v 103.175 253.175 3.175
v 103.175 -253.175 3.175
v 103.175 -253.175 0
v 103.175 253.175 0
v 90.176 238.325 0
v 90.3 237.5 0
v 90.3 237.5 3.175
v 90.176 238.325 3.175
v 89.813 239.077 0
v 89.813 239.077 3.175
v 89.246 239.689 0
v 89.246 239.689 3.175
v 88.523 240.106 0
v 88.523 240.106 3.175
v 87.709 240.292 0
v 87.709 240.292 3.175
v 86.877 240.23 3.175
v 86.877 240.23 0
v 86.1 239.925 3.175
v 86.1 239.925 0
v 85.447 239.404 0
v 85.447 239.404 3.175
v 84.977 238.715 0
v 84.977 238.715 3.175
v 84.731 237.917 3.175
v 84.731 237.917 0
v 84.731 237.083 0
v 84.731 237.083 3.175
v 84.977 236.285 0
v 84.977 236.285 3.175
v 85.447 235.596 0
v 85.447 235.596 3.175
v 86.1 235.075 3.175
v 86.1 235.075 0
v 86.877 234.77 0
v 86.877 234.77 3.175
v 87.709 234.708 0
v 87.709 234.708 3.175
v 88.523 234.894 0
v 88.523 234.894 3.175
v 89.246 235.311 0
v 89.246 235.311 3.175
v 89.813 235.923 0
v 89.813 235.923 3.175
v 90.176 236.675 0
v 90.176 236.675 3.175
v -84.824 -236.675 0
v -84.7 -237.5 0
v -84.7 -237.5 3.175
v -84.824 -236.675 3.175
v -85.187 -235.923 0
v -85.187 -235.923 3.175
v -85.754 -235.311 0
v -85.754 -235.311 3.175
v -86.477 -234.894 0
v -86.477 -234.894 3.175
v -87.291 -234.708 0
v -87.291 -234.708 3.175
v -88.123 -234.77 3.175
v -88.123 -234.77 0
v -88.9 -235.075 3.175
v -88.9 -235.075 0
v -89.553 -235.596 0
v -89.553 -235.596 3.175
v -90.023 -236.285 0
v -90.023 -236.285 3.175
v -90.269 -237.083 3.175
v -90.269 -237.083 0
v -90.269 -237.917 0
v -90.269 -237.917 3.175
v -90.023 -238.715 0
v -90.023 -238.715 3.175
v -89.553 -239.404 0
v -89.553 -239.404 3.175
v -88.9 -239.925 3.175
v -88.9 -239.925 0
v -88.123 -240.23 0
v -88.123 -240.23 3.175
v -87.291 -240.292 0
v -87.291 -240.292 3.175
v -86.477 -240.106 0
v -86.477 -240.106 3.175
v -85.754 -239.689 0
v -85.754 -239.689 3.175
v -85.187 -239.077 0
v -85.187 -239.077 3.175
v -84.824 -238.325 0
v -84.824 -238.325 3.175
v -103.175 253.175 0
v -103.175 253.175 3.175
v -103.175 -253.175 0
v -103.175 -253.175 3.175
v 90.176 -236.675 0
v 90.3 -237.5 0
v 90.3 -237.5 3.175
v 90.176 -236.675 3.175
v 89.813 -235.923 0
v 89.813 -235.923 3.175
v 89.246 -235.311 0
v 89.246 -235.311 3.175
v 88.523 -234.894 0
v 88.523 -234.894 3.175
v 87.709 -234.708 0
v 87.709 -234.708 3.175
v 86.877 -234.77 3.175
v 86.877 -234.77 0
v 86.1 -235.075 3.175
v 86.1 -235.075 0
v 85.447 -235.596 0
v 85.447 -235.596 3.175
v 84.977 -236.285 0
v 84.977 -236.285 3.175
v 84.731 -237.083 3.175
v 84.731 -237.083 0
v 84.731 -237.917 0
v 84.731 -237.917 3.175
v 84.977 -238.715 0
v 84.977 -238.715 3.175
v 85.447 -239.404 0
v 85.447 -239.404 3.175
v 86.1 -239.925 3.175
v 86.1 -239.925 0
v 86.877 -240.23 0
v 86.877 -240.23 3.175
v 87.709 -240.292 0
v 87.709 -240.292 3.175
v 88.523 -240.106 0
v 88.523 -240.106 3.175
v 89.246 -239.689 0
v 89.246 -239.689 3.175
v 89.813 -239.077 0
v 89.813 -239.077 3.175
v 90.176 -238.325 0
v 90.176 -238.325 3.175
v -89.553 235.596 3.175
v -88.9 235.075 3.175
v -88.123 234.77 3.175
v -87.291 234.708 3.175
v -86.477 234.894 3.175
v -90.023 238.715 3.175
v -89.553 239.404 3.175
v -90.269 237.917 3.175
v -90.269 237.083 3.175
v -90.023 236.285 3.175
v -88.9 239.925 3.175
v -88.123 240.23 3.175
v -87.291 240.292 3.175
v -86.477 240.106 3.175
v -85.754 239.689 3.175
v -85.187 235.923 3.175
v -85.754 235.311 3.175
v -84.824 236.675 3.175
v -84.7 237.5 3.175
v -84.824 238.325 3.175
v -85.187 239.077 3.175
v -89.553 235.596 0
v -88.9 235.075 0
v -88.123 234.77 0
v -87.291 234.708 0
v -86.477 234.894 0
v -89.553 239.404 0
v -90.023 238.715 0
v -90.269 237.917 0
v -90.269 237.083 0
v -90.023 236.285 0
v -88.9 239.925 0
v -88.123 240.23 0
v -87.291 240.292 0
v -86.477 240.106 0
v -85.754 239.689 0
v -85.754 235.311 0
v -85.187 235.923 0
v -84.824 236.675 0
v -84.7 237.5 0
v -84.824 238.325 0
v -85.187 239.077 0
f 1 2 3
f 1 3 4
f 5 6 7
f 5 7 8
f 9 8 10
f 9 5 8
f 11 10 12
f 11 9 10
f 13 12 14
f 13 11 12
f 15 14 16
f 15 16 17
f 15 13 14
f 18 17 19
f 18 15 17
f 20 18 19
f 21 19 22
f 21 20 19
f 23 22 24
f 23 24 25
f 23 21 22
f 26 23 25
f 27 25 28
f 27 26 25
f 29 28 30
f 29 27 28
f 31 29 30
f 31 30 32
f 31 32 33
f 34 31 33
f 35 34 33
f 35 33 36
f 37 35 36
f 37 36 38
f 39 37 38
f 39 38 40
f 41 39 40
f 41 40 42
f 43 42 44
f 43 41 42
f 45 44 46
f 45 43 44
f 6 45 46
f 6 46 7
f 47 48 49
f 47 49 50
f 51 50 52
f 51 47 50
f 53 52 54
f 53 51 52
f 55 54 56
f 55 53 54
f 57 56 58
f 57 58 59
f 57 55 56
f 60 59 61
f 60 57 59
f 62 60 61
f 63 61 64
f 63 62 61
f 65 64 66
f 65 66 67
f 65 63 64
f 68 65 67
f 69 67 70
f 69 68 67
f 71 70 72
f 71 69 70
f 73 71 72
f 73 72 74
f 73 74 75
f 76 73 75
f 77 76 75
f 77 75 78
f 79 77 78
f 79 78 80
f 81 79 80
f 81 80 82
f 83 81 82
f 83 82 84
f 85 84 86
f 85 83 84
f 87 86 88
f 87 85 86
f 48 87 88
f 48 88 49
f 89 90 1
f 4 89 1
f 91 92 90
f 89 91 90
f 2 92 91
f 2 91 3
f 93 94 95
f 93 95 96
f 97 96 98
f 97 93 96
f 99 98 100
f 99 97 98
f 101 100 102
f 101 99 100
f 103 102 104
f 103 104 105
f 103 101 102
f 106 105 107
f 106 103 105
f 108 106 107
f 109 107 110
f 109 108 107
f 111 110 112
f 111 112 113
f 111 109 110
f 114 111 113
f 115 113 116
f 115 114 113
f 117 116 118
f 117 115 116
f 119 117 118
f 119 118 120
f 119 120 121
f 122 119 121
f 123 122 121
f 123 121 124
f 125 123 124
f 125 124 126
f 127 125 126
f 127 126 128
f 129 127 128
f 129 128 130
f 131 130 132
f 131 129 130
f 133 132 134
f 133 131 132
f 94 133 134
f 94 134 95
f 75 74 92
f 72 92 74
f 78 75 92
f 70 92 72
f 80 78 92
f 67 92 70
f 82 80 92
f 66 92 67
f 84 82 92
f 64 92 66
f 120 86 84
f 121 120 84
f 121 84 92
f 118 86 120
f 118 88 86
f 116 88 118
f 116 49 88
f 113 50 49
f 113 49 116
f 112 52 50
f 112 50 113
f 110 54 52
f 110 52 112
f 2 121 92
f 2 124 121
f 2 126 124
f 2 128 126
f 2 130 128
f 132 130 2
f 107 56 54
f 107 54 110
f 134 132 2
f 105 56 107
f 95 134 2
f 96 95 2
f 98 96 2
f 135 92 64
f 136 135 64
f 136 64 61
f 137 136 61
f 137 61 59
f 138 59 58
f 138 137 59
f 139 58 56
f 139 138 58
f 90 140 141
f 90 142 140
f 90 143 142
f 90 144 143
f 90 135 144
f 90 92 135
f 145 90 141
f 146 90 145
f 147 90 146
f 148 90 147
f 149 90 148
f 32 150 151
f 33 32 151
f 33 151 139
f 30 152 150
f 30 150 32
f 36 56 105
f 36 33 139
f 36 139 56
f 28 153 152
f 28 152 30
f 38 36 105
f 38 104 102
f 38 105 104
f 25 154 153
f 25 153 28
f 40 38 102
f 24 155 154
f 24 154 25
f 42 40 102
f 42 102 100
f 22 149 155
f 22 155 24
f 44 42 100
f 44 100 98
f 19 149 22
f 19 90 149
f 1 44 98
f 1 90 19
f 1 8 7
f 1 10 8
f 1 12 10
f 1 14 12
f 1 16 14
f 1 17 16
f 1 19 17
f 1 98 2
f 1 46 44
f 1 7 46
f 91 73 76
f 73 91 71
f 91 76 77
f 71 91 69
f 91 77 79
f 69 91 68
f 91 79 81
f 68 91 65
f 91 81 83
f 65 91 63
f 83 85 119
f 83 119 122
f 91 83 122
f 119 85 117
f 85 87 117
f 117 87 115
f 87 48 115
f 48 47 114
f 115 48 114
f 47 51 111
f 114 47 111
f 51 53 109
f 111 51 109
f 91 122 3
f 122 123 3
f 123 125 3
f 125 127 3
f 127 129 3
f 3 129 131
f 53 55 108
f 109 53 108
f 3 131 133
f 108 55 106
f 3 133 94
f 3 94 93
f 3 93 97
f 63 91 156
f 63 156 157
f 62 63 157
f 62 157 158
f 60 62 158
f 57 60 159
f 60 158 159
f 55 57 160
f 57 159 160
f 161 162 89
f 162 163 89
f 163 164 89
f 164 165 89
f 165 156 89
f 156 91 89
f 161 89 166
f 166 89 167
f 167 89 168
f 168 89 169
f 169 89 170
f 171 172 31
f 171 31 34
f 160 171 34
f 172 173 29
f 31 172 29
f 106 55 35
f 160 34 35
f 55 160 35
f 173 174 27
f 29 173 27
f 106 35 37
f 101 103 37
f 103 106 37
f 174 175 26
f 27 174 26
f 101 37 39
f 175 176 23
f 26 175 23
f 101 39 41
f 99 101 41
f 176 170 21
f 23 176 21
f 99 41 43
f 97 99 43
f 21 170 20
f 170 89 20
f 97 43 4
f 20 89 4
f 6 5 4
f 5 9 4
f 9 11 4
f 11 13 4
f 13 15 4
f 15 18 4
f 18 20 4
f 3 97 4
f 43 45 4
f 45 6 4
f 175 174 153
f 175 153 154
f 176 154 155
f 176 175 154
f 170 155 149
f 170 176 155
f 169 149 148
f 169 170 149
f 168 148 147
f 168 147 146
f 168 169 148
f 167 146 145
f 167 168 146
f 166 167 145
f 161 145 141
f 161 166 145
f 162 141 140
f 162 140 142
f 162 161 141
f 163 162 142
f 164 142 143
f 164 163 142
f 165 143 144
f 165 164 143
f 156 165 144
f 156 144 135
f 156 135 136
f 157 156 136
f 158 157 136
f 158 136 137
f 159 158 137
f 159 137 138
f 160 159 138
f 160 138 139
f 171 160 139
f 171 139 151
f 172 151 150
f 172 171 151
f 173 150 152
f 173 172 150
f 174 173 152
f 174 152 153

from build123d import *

# Parameters (mm, degrees)
SKETCH1_W           = 500
SKETCH1_H           = 200
SKETCH1_R           = 2.8
BOSS_EXTRUDE1_DEPTH = 3.175
SKETCH2_W           = 206.35
SKETCH2_H           = 506.35
SKETCH2_W_2         = 200
SKETCH2_H_2         = 500
BOSS_EXTRUDE2_DEPTH = 3.175


with BuildPart() as part:
    # Sketch1 → Boss-Extrude1 (new body)
    with BuildSketch(Plane(origin=(0, 0, 0), x_dir=(0, 1, 0), z_dir=(0, 0, 1))):
        Rectangle(SKETCH1_W, SKETCH1_H)
        with Locations(Location((-237.5, 87.5, 0), (0, 0, 270))):
            Circle(SKETCH1_R, mode=Mode.SUBTRACT)
        with Locations(Location((237.5, 87.5, 0), (0, 0, 270))):
            Circle(SKETCH1_R, mode=Mode.SUBTRACT)
        with Locations(Location((237.5, -87.5, 0), (0, 0, 270))):
            Circle(SKETCH1_R, mode=Mode.SUBTRACT)
        with Locations(Location((-237.5, -87.5, 0), (0, 0, 270))):
            Circle(SKETCH1_R, mode=Mode.SUBTRACT)
    extrude(amount=BOSS_EXTRUDE1_DEPTH)

    # Sketch2 → Boss-Extrude2 (add, through all)
    with BuildSketch(Plane.XY.offset(3.175)):
        Rectangle(SKETCH2_W, SKETCH2_H)
        Rectangle(SKETCH2_W_2, SKETCH2_H_2, mode=Mode.SUBTRACT)
    extrude(amount=-BOSS_EXTRUDE2_DEPTH)


solid = part.part
